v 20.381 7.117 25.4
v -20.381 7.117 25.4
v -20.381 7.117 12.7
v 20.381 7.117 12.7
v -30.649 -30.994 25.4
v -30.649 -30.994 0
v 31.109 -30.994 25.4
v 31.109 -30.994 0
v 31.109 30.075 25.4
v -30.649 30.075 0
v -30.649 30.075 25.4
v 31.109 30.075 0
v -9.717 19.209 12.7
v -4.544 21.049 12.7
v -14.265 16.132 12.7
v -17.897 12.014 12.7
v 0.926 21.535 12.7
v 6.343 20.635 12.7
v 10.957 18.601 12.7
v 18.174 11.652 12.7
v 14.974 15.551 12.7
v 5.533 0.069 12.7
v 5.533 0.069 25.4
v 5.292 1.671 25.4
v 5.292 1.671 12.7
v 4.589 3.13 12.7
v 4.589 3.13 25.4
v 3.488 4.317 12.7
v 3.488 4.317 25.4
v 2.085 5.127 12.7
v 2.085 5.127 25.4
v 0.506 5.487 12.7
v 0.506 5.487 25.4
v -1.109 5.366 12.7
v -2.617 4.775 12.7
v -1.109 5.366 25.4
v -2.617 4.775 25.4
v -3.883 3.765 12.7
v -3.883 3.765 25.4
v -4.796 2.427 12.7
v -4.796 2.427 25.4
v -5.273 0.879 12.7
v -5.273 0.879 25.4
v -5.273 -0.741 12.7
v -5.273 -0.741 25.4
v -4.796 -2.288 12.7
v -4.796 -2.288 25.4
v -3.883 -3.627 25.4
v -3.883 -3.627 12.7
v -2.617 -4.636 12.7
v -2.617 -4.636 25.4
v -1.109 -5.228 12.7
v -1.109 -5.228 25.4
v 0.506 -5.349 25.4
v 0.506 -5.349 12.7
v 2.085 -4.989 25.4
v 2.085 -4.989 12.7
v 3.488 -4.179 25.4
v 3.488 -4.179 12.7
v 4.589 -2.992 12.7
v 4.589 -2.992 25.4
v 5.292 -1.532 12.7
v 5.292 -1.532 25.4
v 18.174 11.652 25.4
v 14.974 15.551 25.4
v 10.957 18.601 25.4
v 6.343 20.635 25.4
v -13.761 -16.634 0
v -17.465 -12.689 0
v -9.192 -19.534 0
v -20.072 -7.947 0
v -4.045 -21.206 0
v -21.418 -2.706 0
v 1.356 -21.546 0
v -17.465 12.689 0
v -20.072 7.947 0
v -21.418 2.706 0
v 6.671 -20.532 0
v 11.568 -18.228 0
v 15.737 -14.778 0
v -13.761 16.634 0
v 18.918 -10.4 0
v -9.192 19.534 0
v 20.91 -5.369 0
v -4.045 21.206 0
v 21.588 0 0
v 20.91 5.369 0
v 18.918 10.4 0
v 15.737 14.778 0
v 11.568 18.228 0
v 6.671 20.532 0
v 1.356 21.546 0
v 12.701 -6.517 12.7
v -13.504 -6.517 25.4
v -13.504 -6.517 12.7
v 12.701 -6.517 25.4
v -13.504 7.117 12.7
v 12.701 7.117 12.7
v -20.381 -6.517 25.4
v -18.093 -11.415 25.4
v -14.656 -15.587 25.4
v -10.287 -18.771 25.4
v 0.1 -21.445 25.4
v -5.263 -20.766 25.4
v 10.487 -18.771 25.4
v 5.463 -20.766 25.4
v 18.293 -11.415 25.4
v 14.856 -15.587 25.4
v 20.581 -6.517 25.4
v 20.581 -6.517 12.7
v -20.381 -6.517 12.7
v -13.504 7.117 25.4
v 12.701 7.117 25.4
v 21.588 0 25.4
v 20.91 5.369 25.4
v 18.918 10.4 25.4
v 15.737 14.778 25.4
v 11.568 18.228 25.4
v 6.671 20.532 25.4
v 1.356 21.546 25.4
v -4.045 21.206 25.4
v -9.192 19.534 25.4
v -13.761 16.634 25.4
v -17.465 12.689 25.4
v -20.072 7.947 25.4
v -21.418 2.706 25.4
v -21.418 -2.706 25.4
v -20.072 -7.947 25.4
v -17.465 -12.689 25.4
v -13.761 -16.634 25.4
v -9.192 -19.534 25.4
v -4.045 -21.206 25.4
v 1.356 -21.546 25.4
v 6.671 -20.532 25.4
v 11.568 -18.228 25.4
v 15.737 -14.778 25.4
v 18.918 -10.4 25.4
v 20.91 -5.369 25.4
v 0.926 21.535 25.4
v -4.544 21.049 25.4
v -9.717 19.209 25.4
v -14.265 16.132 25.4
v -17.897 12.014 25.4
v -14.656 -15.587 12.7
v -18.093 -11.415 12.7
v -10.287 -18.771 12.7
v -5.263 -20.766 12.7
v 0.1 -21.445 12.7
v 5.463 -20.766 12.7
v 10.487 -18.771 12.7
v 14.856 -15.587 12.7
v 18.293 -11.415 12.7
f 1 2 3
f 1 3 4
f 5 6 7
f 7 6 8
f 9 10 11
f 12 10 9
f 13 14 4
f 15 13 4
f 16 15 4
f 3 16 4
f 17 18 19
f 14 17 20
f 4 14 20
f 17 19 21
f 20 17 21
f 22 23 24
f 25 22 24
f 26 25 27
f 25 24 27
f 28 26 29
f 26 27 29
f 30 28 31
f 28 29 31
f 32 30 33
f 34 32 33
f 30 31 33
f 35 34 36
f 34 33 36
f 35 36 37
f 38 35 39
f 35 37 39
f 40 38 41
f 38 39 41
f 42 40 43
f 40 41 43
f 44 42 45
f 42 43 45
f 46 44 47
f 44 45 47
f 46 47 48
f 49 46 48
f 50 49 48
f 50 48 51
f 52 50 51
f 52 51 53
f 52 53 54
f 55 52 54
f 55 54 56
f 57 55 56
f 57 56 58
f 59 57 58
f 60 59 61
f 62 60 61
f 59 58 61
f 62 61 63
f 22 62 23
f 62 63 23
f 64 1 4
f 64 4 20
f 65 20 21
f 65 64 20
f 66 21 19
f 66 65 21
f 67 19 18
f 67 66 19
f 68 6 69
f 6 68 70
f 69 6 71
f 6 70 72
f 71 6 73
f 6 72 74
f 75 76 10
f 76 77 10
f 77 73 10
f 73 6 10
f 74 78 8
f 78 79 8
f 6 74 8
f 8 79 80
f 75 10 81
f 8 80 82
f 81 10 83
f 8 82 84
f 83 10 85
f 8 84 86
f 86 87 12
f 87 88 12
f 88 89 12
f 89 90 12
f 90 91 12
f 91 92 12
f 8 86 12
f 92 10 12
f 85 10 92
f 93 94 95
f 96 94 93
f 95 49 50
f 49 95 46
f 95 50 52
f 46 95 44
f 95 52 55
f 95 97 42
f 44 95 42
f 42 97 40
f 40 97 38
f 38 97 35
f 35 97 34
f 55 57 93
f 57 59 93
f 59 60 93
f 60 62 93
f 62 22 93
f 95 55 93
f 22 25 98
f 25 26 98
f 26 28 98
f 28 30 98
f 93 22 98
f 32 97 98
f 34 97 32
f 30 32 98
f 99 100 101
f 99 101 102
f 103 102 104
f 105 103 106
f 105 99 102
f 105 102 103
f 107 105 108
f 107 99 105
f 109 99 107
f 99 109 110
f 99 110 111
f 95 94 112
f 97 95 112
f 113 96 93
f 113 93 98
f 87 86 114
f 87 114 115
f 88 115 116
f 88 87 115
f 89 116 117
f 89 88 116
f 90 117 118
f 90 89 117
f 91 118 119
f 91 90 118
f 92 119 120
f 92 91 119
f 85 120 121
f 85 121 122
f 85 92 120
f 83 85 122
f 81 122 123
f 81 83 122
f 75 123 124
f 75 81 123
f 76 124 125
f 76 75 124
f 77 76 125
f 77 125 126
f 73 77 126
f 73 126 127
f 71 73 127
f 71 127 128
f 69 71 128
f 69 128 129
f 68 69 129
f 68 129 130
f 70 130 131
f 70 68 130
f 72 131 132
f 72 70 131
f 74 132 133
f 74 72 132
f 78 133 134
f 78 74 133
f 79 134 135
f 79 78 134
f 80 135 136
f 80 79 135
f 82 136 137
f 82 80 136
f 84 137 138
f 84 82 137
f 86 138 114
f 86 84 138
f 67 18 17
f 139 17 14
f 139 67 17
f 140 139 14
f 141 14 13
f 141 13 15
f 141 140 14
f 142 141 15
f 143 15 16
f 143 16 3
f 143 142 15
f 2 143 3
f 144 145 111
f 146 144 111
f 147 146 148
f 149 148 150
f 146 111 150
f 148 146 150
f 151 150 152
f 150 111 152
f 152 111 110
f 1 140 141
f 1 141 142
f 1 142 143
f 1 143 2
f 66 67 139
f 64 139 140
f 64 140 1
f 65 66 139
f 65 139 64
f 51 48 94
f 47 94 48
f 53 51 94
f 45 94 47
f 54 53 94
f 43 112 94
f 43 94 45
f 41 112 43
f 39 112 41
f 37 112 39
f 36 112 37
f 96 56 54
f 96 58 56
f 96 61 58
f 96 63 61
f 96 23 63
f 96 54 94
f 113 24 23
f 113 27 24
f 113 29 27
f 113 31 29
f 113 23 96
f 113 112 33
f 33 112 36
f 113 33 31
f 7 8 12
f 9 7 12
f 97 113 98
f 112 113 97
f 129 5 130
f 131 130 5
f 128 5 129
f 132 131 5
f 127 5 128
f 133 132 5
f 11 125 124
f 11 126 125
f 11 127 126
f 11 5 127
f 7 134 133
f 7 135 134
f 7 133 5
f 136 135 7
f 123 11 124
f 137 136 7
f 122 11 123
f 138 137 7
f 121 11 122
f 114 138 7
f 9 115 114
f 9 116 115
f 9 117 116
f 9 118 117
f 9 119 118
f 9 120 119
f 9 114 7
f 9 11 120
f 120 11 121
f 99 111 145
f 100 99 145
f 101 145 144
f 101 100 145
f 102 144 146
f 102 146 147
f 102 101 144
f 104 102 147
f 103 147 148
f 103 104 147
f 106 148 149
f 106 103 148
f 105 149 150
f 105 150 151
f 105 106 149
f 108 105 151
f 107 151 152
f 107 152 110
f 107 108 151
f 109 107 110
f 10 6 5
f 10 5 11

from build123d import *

# Parameters (mm, degrees)
F0_W     = 61.7580674589
F0_H     = 61.0693208873
F0_R     = 21.5882111265
F1_DEPTH = 25.4
F3_DEPTH = 12.7
F4_DEPTH = 12.7
F2_W     = 13.4601416066
F2_H     = 13.6345517801
F2_R     = 5.4335056299
F2_W_2   = 5.8629224077
F2_W_3   = 6.8816458806
F5_DEPTH = 12.7


with BuildPart() as f1:
    # F0 (on Top) → F1 (new body)
    with BuildSketch(Plane.XY):
        with Locations((0.2295803279, -0.4591662437)):
            Rectangle(F0_W, F0_H)
        Circle(F0_R, mode=Mode.SUBTRACT)
    extrude(amount=F1_DEPTH)


with BuildPart() as f3:
    # F2 (on face) → F3 (new body)
    with BuildSketch(Plane.XY.offset(25.4)):
        with BuildLine():
            ThreePointArc((6.3425534195, 20.6354761458), (-9.7169764237, 19.2090718161), (-20.3813017202, 7.1171201925))
            Line((-20.3813017202, 7.1171201925), (-13.5036455467, 7.1171201925))
            Line((-13.5036455467, 7.1171201925), (-7.640723139, 7.1171201925))
            Line((-7.640723139, 7.1171201925), (5.8194184676, 7.1171201925))
            Line((5.8194184676, 7.1171201925), (12.7010643482, 7.1171201925))
            Line((12.7010643482, 7.1171201925), (20.3813017202, 7.1171201925))
            ThreePointArc((20.3813017202, 7.1171201925), (14.9742310421, 15.5506676494), (6.3425534195, 20.6354761458))
        make_face()
    extrude(amount=-F3_DEPTH)


with BuildPart() as f4:
    # F2 (on face) → F4 (new body)
    with BuildSketch(Plane.XY.offset(25.4)):
        with BuildLine():
            Line((-13.5036455467, -6.5174315876), (-20.3813017202, -6.5174315876))
            ThreePointArc((-20.3813017202, -6.5174315876), (0.0998052176, -21.4450623609), (20.5809121553, -6.5174315876))
            Line((20.5809121553, -6.5174315876), (12.7010643482, -6.5174315876))
            Line((12.7010643482, -6.5174315876), (5.8194184676, -6.5174315876))
            Line((5.8194184676, -6.5174315876), (-7.640723139, -6.5174315876))
            Line((-7.640723139, -6.5174315876), (-13.5036455467, -6.5174315876))
        make_face()
    extrude(amount=-F4_DEPTH)


with BuildPart() as f5:
    # F2 (on face) → F5 (new body)
    with BuildSketch(Plane.XY.offset(25.4)):
        with Locations((-0.9106523357, 0.2998443025)):
            Rectangle(F2_W, F2_H)
        with Locations((0.0998052176, 0.0690650869)):
            Circle(F2_R, mode=Mode.SUBTRACT)
        with Locations((-10.5721843429, 0.2998443025)):
            Rectangle(F2_W_2, F2_H)
        with Locations((9.2602414079, 0.2998443025)):
            Rectangle(F2_W_3, F2_H)
    extrude(amount=-F5_DEPTH)


solid = Compound([f1.part, f3.part, f4.part, f5.part])
